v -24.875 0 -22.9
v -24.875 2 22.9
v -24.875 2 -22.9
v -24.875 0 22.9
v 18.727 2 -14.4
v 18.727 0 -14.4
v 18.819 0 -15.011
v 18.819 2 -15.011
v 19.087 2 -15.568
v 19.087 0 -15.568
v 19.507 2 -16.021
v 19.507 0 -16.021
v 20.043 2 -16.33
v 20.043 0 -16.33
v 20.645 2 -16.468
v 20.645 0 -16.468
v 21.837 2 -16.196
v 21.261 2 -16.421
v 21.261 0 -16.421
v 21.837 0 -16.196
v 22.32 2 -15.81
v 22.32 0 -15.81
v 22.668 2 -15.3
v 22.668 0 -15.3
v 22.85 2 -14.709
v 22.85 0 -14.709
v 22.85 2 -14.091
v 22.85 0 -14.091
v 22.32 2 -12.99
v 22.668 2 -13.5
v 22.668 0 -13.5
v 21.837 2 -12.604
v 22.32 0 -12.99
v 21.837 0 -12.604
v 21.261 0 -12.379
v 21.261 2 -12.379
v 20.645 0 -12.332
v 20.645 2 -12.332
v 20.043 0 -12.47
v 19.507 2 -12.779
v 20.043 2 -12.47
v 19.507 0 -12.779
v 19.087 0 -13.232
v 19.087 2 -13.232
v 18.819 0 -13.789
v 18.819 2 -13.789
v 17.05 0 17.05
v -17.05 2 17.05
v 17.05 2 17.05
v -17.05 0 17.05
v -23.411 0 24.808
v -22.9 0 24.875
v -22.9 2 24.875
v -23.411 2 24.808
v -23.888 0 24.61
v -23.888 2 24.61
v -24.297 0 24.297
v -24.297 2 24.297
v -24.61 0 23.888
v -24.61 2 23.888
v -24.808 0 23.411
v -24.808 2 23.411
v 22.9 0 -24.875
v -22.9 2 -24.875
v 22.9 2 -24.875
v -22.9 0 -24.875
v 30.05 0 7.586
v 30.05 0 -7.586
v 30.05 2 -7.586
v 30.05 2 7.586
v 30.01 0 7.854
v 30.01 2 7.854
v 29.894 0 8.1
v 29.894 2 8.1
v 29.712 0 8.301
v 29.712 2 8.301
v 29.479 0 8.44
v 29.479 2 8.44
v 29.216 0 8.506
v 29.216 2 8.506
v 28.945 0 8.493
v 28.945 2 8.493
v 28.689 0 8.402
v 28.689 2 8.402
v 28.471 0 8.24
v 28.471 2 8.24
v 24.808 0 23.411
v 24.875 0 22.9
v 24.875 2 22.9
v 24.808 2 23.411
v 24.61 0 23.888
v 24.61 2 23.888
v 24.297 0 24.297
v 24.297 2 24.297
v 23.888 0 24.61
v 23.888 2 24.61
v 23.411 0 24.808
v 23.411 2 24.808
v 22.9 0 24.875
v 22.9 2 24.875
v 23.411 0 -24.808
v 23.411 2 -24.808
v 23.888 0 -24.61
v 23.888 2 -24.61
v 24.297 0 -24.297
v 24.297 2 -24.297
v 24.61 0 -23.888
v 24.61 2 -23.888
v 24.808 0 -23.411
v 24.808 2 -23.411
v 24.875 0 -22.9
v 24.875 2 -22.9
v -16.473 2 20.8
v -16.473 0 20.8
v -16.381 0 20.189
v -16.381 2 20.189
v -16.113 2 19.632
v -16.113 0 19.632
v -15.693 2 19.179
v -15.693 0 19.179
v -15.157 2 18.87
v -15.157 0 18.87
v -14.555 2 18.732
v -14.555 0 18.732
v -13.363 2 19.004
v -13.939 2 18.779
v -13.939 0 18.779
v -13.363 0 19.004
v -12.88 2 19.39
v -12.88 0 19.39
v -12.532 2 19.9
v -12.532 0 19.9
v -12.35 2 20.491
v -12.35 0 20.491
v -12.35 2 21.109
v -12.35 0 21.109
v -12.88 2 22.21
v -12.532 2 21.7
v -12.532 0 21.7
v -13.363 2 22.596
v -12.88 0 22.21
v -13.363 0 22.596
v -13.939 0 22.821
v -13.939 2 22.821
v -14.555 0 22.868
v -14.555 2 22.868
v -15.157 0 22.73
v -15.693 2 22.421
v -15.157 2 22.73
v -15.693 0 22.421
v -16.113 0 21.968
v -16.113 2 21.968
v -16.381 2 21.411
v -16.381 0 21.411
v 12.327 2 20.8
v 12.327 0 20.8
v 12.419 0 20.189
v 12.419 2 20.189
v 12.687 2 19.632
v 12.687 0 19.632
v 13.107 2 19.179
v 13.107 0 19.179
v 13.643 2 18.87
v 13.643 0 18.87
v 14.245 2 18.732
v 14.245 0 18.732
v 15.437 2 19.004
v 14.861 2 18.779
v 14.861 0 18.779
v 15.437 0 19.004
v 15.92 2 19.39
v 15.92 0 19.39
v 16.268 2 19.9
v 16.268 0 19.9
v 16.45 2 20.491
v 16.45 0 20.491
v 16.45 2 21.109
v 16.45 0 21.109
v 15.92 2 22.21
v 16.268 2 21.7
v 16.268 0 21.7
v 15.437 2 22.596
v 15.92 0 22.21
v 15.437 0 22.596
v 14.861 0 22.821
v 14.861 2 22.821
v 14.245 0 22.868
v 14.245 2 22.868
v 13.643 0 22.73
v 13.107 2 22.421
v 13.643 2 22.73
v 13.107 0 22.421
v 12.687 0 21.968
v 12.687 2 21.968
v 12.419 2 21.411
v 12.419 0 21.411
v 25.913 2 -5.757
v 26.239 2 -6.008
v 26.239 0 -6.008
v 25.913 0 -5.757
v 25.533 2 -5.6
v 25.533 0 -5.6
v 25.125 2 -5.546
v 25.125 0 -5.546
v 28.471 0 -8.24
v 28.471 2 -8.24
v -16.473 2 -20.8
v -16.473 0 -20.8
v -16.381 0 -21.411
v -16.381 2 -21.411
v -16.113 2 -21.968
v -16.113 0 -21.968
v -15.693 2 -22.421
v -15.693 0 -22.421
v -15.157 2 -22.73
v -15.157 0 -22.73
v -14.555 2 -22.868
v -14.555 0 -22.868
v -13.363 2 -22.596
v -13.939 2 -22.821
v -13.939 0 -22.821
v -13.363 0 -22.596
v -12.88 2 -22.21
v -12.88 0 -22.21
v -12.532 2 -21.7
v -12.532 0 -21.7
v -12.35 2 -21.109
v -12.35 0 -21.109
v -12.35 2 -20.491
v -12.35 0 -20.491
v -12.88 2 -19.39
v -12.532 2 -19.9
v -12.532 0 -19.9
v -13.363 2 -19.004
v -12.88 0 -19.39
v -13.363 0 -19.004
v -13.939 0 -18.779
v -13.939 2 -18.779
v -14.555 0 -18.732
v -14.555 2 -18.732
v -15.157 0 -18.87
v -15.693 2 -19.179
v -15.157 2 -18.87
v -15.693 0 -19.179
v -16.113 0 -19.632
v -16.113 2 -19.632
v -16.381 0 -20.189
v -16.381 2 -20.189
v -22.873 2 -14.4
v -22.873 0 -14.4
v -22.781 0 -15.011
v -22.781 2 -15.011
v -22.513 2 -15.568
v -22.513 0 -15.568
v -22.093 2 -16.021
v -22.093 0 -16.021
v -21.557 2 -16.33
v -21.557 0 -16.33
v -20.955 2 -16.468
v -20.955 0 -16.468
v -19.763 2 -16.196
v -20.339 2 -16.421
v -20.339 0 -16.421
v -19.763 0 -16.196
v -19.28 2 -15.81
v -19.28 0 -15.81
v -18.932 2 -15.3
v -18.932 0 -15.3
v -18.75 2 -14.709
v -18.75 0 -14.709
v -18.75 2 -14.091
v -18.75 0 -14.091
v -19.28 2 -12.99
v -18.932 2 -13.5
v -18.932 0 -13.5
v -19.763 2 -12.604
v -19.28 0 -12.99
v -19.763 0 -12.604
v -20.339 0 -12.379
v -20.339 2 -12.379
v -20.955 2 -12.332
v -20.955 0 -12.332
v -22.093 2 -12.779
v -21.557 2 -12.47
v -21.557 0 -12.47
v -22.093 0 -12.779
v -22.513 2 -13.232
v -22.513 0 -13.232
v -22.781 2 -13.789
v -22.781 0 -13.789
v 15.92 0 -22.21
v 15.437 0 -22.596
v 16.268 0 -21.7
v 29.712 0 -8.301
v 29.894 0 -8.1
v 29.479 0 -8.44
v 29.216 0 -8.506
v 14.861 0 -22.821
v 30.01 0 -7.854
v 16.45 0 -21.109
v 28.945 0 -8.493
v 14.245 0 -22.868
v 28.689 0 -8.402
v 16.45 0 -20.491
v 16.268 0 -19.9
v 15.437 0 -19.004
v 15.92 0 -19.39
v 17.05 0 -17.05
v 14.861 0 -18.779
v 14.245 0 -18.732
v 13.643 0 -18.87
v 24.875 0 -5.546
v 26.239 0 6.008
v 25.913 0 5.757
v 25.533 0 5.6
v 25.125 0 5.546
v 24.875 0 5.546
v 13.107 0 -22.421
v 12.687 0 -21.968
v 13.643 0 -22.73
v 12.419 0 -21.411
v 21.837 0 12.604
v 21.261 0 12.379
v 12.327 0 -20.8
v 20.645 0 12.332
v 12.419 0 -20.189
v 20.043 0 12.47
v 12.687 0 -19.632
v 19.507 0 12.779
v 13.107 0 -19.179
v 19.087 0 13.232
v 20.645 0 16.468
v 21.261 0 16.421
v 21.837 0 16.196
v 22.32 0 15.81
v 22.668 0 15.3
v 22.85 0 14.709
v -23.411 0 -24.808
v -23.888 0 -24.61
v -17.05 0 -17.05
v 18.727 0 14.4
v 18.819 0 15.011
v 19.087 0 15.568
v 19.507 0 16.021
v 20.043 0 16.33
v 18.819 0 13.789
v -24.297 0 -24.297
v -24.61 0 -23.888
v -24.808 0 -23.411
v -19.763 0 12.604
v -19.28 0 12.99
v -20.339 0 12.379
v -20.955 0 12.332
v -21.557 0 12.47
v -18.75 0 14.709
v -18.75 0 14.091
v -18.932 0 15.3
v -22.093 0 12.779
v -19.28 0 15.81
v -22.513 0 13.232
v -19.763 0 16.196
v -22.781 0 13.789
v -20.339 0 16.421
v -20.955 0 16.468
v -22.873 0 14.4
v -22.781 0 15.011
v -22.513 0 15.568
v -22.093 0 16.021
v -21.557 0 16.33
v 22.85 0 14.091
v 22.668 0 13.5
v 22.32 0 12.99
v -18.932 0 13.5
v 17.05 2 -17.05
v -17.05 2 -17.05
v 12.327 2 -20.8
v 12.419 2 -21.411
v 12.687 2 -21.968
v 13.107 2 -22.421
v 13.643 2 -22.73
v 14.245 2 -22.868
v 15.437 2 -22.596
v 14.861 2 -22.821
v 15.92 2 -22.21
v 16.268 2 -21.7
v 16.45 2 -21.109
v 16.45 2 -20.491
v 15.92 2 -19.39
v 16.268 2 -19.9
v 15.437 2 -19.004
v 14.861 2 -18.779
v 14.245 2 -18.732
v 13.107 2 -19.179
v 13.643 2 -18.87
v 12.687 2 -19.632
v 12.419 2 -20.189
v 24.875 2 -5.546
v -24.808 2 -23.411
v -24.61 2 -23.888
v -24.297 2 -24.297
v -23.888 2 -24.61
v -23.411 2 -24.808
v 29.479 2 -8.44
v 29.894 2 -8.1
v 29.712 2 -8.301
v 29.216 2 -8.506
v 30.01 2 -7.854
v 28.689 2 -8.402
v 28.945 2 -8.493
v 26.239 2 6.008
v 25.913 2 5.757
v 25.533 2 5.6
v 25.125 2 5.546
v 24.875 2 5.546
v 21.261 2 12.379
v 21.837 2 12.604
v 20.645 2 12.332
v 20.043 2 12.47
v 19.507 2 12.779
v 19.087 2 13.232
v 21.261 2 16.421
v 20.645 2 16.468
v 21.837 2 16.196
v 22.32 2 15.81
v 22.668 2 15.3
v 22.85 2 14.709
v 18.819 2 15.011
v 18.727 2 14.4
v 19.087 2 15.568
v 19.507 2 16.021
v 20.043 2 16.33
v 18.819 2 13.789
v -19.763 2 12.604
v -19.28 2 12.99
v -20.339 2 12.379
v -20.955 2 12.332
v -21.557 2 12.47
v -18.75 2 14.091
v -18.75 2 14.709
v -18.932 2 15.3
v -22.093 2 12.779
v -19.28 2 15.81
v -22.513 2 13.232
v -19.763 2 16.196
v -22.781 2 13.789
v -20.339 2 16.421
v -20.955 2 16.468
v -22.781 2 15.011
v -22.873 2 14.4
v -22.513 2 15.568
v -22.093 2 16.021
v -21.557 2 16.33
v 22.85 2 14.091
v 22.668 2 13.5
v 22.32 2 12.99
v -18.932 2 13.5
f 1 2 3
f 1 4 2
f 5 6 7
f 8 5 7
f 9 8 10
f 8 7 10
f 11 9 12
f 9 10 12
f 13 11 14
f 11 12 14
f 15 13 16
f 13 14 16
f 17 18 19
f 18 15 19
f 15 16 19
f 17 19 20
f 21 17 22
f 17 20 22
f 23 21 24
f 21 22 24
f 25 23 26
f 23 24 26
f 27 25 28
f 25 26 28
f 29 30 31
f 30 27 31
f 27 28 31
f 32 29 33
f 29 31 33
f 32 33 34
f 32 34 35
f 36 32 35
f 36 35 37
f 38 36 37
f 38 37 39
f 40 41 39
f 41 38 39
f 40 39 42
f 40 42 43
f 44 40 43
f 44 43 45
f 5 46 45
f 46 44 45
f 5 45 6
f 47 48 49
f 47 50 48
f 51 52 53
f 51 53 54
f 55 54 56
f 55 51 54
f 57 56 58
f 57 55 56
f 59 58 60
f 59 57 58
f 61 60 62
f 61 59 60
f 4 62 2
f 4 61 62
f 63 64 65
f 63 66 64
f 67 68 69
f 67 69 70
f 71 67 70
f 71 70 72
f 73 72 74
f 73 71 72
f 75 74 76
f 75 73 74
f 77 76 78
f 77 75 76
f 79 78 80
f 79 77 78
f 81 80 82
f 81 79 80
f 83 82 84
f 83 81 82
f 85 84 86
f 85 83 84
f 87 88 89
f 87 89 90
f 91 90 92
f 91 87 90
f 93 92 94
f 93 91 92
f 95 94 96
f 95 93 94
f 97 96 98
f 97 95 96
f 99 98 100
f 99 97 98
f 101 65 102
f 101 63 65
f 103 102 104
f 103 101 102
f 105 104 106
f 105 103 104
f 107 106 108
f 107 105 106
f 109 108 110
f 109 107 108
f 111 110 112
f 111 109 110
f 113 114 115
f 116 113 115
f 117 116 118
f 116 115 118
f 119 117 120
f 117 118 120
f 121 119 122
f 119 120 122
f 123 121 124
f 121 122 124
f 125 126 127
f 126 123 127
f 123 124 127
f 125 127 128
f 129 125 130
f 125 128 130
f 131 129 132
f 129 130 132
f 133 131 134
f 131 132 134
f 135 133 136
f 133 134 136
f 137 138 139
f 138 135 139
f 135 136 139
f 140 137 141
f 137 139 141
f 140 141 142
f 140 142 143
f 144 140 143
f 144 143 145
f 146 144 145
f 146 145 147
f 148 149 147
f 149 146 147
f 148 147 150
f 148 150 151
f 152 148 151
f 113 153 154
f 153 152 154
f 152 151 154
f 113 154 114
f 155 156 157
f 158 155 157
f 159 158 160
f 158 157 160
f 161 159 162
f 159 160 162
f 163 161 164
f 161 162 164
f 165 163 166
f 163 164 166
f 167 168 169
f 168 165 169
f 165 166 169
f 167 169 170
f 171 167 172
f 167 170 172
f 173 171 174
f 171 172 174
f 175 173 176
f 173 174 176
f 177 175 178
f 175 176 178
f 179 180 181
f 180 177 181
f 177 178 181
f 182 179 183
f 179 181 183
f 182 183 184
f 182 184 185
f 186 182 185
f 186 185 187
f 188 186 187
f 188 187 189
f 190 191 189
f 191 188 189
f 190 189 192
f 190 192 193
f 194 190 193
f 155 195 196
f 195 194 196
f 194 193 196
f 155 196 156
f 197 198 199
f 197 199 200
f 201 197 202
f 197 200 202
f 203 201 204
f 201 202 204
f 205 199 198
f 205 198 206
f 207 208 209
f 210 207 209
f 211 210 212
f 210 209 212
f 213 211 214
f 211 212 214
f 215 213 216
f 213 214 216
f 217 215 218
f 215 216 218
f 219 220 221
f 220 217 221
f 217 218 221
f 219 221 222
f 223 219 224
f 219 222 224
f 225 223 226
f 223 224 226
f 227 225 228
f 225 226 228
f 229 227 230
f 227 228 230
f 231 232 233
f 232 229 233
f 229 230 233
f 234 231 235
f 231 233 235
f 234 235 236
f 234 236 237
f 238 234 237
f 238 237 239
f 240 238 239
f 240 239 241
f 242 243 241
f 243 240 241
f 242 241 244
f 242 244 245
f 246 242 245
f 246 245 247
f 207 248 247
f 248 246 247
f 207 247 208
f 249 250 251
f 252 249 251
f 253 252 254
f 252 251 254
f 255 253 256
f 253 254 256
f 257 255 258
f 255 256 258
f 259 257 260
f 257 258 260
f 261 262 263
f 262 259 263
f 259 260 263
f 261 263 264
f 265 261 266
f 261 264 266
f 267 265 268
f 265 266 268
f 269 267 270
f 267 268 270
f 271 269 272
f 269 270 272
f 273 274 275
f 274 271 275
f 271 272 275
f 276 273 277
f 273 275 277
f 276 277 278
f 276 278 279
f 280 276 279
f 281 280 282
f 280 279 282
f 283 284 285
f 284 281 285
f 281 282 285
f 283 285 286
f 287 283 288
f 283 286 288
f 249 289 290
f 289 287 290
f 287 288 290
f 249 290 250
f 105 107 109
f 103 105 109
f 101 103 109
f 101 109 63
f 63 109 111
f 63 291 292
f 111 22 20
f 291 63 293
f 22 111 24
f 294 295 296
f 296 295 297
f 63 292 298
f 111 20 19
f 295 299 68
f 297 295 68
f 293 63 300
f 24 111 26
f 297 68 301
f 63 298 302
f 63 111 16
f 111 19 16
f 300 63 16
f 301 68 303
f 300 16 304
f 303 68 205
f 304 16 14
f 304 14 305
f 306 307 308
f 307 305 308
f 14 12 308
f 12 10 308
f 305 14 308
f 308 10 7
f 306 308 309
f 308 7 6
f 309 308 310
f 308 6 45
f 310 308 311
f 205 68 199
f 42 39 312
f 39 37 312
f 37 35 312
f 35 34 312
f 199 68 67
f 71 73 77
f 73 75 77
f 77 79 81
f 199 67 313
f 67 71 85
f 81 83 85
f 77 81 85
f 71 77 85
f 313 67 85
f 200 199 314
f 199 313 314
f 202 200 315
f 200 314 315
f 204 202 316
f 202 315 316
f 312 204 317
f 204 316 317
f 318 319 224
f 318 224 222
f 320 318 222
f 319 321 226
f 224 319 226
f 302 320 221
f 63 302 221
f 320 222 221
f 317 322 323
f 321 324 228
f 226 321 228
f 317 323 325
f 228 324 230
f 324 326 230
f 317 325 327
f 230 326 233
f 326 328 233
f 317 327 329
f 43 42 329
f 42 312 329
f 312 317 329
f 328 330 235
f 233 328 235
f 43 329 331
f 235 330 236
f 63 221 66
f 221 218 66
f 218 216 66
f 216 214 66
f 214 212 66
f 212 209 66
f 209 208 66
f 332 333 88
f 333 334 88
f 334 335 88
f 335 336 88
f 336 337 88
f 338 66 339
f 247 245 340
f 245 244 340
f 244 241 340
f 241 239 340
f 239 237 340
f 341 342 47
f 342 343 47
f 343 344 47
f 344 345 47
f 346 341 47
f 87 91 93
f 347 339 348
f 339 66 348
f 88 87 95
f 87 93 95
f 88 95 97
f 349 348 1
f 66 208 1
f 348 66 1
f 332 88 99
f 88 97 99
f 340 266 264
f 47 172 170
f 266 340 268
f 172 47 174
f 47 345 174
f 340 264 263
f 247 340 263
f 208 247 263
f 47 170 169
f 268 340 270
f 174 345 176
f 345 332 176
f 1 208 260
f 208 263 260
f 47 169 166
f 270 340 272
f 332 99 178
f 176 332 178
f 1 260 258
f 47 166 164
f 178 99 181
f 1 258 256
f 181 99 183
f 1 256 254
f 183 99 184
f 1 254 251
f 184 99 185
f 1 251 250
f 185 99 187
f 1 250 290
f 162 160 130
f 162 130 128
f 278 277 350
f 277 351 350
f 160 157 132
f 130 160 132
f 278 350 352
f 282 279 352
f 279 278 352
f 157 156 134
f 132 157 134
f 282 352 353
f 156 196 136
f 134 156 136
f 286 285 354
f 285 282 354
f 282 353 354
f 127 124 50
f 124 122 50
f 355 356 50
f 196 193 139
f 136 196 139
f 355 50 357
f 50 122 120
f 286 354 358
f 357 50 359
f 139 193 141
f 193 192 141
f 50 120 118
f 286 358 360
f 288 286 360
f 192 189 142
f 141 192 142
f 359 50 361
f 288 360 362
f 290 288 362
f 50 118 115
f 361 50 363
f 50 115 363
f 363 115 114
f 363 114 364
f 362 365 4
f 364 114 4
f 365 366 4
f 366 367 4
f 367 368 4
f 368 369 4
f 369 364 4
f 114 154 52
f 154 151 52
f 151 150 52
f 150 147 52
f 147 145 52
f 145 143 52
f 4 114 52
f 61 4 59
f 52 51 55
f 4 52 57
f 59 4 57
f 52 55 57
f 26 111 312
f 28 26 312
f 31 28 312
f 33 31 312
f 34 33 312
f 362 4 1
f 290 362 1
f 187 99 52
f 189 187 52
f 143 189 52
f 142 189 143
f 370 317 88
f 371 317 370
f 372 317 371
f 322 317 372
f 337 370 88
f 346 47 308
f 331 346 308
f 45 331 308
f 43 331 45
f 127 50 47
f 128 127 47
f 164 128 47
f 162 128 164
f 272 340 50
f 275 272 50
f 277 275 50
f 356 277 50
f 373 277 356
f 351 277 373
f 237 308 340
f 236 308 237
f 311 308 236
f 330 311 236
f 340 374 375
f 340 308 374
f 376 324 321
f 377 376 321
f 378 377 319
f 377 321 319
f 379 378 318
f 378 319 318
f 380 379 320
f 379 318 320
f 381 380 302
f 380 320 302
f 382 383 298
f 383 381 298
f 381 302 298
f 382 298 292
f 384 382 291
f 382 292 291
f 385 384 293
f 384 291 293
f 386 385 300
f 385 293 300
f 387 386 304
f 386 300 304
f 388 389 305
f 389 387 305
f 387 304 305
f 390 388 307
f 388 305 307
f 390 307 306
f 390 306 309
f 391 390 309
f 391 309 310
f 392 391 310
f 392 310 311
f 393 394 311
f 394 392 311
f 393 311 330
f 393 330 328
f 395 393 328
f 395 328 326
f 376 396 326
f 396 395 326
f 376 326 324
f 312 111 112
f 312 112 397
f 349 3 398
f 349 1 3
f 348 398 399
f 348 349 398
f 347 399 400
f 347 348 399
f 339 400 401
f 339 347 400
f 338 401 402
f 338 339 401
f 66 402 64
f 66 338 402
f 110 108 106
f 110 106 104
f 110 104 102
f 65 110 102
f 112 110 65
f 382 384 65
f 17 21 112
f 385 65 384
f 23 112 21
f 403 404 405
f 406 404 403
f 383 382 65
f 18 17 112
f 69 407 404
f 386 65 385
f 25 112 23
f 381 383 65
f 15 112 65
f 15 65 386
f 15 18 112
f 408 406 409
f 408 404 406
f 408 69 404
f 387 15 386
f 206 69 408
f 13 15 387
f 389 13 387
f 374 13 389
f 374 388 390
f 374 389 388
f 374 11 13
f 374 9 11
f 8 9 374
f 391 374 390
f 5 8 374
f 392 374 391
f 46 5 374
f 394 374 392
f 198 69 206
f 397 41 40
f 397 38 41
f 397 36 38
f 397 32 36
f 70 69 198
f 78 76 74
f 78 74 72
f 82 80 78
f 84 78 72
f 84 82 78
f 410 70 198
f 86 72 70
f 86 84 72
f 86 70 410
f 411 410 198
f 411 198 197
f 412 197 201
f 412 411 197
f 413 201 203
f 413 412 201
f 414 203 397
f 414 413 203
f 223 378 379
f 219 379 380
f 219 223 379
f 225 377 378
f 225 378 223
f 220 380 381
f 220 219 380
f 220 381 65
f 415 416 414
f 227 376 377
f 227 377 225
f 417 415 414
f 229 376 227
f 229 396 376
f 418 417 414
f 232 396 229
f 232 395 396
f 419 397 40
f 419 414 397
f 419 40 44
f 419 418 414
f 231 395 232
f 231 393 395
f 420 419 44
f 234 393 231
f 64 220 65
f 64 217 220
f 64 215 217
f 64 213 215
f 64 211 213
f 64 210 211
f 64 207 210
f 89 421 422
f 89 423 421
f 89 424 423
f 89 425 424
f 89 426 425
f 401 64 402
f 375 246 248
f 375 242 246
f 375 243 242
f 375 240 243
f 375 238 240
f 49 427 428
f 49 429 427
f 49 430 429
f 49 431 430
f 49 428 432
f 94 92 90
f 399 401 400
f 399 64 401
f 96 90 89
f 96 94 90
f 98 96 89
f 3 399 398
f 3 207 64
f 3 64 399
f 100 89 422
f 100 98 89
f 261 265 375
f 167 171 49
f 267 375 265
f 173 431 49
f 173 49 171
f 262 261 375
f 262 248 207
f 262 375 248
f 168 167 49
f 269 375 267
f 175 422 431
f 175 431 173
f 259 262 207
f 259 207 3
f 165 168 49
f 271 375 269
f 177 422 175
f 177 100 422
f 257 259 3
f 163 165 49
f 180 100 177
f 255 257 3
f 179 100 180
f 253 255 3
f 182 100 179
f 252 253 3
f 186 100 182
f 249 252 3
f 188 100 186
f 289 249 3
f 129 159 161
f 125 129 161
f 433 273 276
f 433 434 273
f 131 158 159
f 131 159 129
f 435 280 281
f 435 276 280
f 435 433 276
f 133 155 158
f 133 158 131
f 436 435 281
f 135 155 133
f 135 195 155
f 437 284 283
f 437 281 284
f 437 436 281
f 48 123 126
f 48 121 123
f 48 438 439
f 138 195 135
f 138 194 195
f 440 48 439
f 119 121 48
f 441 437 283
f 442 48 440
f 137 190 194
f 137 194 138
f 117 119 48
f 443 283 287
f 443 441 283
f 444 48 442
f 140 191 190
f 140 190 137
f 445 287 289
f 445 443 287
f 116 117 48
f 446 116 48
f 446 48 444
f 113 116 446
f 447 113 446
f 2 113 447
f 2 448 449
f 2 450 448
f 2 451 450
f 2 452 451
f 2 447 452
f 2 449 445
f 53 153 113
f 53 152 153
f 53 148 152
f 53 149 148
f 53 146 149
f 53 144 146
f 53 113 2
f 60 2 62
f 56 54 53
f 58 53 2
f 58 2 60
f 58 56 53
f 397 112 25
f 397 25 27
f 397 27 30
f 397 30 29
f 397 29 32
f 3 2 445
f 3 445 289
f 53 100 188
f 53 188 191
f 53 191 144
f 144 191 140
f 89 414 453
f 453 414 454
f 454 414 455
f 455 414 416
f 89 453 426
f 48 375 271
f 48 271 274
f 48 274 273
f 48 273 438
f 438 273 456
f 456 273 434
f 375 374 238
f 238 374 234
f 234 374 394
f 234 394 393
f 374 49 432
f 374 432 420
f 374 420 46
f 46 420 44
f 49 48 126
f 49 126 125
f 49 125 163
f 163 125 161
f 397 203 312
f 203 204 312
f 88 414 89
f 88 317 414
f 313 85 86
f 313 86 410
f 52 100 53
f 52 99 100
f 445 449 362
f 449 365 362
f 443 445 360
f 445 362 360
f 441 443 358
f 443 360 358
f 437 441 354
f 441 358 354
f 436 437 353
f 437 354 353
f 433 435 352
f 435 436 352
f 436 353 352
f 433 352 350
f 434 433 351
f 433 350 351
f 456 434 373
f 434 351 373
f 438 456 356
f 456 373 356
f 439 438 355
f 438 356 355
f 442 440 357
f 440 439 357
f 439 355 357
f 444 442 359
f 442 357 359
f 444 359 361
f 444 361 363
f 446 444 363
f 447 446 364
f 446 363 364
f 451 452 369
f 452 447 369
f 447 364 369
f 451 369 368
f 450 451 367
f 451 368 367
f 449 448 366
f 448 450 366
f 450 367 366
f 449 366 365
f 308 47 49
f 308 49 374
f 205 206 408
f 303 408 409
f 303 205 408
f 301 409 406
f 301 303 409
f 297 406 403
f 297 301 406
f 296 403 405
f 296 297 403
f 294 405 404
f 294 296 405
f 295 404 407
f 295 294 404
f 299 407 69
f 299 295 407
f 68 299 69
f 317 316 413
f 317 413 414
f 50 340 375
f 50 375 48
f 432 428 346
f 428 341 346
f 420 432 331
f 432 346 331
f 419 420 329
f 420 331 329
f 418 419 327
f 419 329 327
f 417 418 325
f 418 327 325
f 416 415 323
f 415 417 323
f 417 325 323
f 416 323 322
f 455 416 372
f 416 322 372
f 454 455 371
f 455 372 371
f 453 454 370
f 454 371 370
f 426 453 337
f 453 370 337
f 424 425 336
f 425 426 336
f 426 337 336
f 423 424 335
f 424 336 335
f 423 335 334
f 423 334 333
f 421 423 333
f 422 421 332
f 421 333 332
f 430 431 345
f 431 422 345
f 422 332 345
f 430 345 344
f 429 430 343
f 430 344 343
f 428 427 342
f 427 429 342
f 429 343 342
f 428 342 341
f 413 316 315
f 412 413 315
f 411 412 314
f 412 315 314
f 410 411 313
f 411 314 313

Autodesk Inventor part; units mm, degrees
ref_plane "YZ Plane" through (0, 0, 0) normal (1, 0, 0) x (0, 1, 0)
ref_plane "XZ Plane" through (0, 0, 0) normal (0, 1, 0) x (-1, 0, 0)
ref_plane "XY Plane" through (0, 0, 0) normal (0, 0, 1) x (1, 0, 0)
sketch "Sketch1" plane through (0, 0, 0) normal (0, 1, 0) x (-1, 0, 0)
  circle A0 centre (-21.9, -21.9) radius 1.875 projected
  circle A1 centre (21.9, 21.9) radius 1.875 projected
  circle A2 centre (21.9, -21.9) radius 1.875 projected
  circle A3 centre (-21.9, 21.9) radius 1.875 projected
  circle A4 centre (14.4, 20.8) radius 2.0734 projected
  circle A5 centre (-14.4, -20.8) radius 2.0734 projected
  circle A6 centre (14.4, -20.8) radius 2.0734 projected
  circle A7 centre (20.8, -14.4) radius 2.0734 projected
  line L0 (-17.05, 17.05) -> (-17.05, -17.05) projected
  line L1 (17.05, 17.05) -> (-17.05, 17.05) projected
  line L2 (17.05, -17.05) -> (17.05, 17.05) projected
  line L3 (-17.05, -17.05) -> (17.05, -17.05) projected
  circle A8 centre (20.8, 14.4) radius 2.0734 projected
  circle A9 centre (-14.4, 20.8) radius 2.0734 projected
  circle A10 centre (-20.8, -14.4) radius 2.0734 projected
  circle A11 centre (-20.8, 14.4) radius 2.0734 projected
  line L4 (-22.9, 24.875) -> (22.9, 24.875) projected
  arc A12 (-22.9, 24.875) -> (-24.875, 22.9) centre (-22.9, 22.9) ccw projected
  line L5 (-24.875, -22.9) -> (-24.875, 22.9) projected
  arc A13 (-24.875, -22.9) -> (-22.9, -24.875) centre (-22.9, -22.9) ccw projected
  line L6 (22.9, -24.875) -> (-22.9, -24.875) projected
  arc A14 (22.9, -24.875) -> (24.875, -22.9) centre (22.9, -22.9) ccw projected
  line L7 (24.875, 22.9) -> (24.875, -22.9) projected
  arc A15 (24.875, 22.9) -> (22.9, 24.875) centre (22.9, 22.9) ccw projected
  arc A16 (24.9, 22.9) -> (22.9, 24.9) centre (22.9, 22.9) ccw projected
  line L8 (22.9, 24.9) -> (-22.9, 24.9) projected
  arc A17 (-22.9, 24.9) -> (-24.9, 22.9) centre (-22.9, 22.9) ccw projected
  line L9 (-24.9, 22.9) -> (-24.9, -22.9) projected
  arc A18 (-24.9, -22.9) -> (-22.9, -24.9) centre (-22.9, -22.9) ccw projected
  line L10 (-22.9, -24.9) -> (22.9, -24.9) projected
  arc A19 (22.9, -24.9) -> (24.9, -22.9) centre (22.9, -22.9) ccw projected
  line L11 (24.9, -22.9) -> (24.9, 22.9) projected
  point P0 (0, 0)
extrude "Extrusion1" add sketch "Sketch1" along normal blind 2 contours A0 | A1 | A2 | A3 | L4 A15 L7 A14 L6 A13 L5 A12
sketch "Sketch2" plane through (0, 0, 0) normal (0, 1, 0) x (-1, 0, 0)
  line L0 (-7.5858, -29.875) -> (7.5858, -29.875)
  line L1 (10, -29.875) -> (10, -19.875)
  line L2 (7.5858, -19.875) -> (-7.5858, -19.875)
  line L3 (-10, -19.875) -> (-10, -29.875)
  line L4 (-10, -29.875) -> (10, -19.875) construction
  line L5 (10, -29.875) -> (-10, -19.875) construction
  line L6 (-8.2929, -21.5821) -> (-6.0607, -23.8143)
  line L7 (-10, -19.875) -> (-6.8431, -19.875) construction
  line L8 (8.2929, -21.5821) -> (6.0607, -23.8143)
  line L9 (-8.2929, -28.1679) -> (-6.0607, -25.9357)
  line L10 (8.2929, -28.1679) -> (6.0607, -25.9357)
  arc A0 (-8.2929, -28.1679) -> (-7.5858, -29.875) centre (-7.5858, -28.875) ccw
  arc A1 (7.5858, -29.875) -> (8.2929, -28.1679) centre (7.5858, -28.875) ccw
  arc A2 (-6.0607, -25.9357) -> (-6.0607, -23.8143) centre (-7.1213, -24.875) ccw
  arc A3 (6.0607, -23.8143) -> (6.0607, -25.9357) centre (7.1213, -24.875) ccw
  arc A4 (-7.5858, -19.875) -> (-8.2929, -21.5821) centre (-7.5858, -20.875) ccw
  arc A5 (8.2929, -21.5821) -> (7.5858, -19.875) centre (7.5858, -20.875) ccw
  line L11 (-7.5858, -19.95) -> (7.5858, -19.95)
  arc A6 (8.2399, -21.5291) -> (7.5858, -19.95) centre (7.5858, -20.875) ccw
  line L12 (8.2399, -21.5291) -> (6.0076, -23.7613)
  arc A7 (6.0076, -23.7613) -> (6.0076, -25.9887) centre (7.1213, -24.875) ccw
  line L13 (6.0076, -25.9887) -> (8.2399, -28.2209)
  arc A8 (7.5858, -29.8) -> (8.2399, -28.2209) centre (7.5858, -28.875) ccw
  line L14 (7.5858, -29.8) -> (-7.5858, -29.8)
  arc A9 (-8.2399, -28.2209) -> (-7.5858, -29.8) centre (-7.5858, -28.875) ccw
  line L15 (-8.2399, -28.2209) -> (-6.0076, -25.9887)
  arc A10 (-6.0076, -25.9887) -> (-6.0076, -23.7613) centre (-7.1213, -24.875) ccw
  line L16 (-6.0076, -23.7613) -> (-8.2399, -21.5291)
  arc A11 (-7.5858, -19.95) -> (-8.2399, -21.5291) centre (-7.5858, -20.875) ccw
  line L17 (-8.2399, 21.7791) -> (-6.0076, 24.0113)
  line L18 (-7.5858, 30.05) -> (7.5858, 30.05)
  line L19 (7.5858, 20.2) -> (-7.5858, 20.2)
  line L20 (-7.5858, 20.125) -> (7.5858, 20.125)
  line L21 (7.5858, 30.125) -> (-7.5858, 30.125)
  line L22 (10, 20.125) -> (-10, 30.125) construction
  line L23 (-10, 20.125) -> (10, 30.125) construction
  arc A12 (-6.0076, 24.0113) -> (-6.0076, 26.2387) centre (-7.1213, 25.125) ccw
  arc A13 (-6.0607, 24.0643) -> (-6.0607, 26.1857) centre (-7.1213, 25.125) ccw
  arc A14 (-7.5858, 30.05) -> (-8.2399, 28.4709) centre (-7.5858, 29.125) ccw
  arc A15 (-7.5858, 30.125) -> (-8.2929, 28.4179) centre (-7.5858, 29.125) ccw
  line L24 (-8.2929, 28.4179) -> (-6.0607, 26.1857)
  line L25 (-10, 30.125) -> (-6.8431, 30.125) construction
  line L26 (-10, 30.125) -> (-10, 20.125)
  arc A16 (-8.2399, 21.7791) -> (-7.5858, 20.2) centre (-7.5858, 21.125) ccw
  arc A17 (-8.2929, 21.8321) -> (-7.5858, 20.125) centre (-7.5858, 21.125) ccw
  line L27 (-8.2929, 21.8321) -> (-6.0607, 24.0643)
  line L28 (-6.0076, 26.2387) -> (-8.2399, 28.4709)
  line L29 (10, 20.125) -> (10, 30.125)
  line L30 (8.2929, 28.4179) -> (6.0607, 26.1857)
  line L31 (8.2929, 21.8321) -> (6.0607, 24.0643)
  arc A18 (7.5858, 20.125) -> (8.2929, 21.8321) centre (7.5858, 21.125) ccw
  arc A19 (6.0076, 26.2387) -> (6.0076, 24.0113) centre (7.1213, 25.125) ccw
  arc A20 (6.0607, 26.1857) -> (6.0607, 24.0643) centre (7.1213, 25.125) ccw
  arc A21 (7.5858, 20.2) -> (8.2399, 21.7791) centre (7.5858, 21.125) ccw
  line L32 (6.0076, 24.0113) -> (8.2399, 21.7791)
  line L33 (8.2399, 28.4709) -> (6.0076, 26.2387)
  arc A22 (8.2929, 28.4179) -> (7.5858, 30.125) centre (7.5858, 29.125) ccw
  arc A23 (8.2399, 28.4709) -> (7.5858, 30.05) centre (7.5858, 29.125) ccw
  line L34 (0, 24.875) -> (0, 25.125)
  line L35 (-22.9, -24.875) -> (22.9, -24.875) projected
  line L36 (22.9, 24.875) -> (-22.9, 24.875) projected
  line L37 (0, -24.875) -> (0, -24.875)
  line L38 (5.6213, 25.125) -> (5.5463, 25.125)
  line L39 (5.5463, 25.125) -> (5.5463, 24.875)
  line L40 (5.5463, 24.875) -> (5.6213, 24.875)
  line L41 (5.6213, 24.875) -> (5.6213, 25.125)
  line L42 (-5.6213, 25.125) -> (-5.5463, 25.125)
  line L43 (-5.5463, 25.125) -> (-5.5463, 24.875)
  line L44 (-5.5463, 24.875) -> (-5.6213, 24.875)
  line L45 (-5.6213, 24.875) -> (-5.6213, 25.125)
  line L46 (-5.6213, -24.875) -> (-5.5463, -24.875)
  line L47 (-5.5463, -24.875) -> (-5.5463, -24.875)
  line L48 (-5.5463, -24.875) -> (-5.6213, -24.875)
  line L49 (-5.6213, -24.875) -> (-5.6213, -24.875)
  line L50 (5.6213, -24.875) -> (5.5463, -24.875)
  line L51 (5.5463, -24.875) -> (5.5463, -24.875)
  line L52 (5.5463, -24.875) -> (5.6213, -24.875)
  line L53 (5.6213, -24.875) -> (5.6213, -24.875)
  arc A24 (19.95, -7.5858) -> (21.5291, -8.2399) centre (20.875, -7.5858) ccw
  arc A25 (19.875, -7.5858) -> (21.5821, -8.2929) centre (20.875, -7.5858) ccw
  line L54 (21.5821, -8.2929) -> (23.8143, -6.0607)
  line L55 (23.7613, -6.0076) -> (21.5291, -8.2399)
  arc A26 (25.9357, -6.0607) -> (23.8143, -6.0607) centre (24.875, -7.1213) ccw
  arc A27 (25.9887, -6.0076) -> (23.7613, -6.0076) centre (24.875, -7.1213) ccw
  line L56 (29.875, -7.5858) -> (29.875, 7.5858)
  line L57 (29.8, 7.5858) -> (29.8, -7.5858)
  line L58 (19.95, -7.5858) -> (19.95, 7.5858)
  line L59 (19.875, 7.5858) -> (19.875, -7.5858)
  line L60 (28.2209, -8.2399) -> (25.9887, -6.0076)
  line L61 (21.5821, 8.2929) -> (23.8143, 6.0607)
  line L62 (28.1679, 8.2929) -> (25.9357, 6.0607)
  arc A28 (29.875, 7.5858) -> (28.1679, 8.2929) centre (28.875, 7.5858) ccw
  arc A29 (23.7613, 6.0076) -> (25.9887, 6.0076) centre (24.875, 7.1213) ccw
  line L63 (24.875, 5.5463) -> (24.875, 5.5463)
  line L64 (24.875, 5.6213) -> (24.875, 5.5463)
  line L65 (24.875, 5.5463) -> (24.875, 5.6213)
  line L66 (24.875, 5.6213) -> (24.875, 5.6213)
  arc A30 (23.8143, 6.0607) -> (25.9357, 6.0607) centre (24.875, 7.1213) ccw
  line L67 (25.9887, 6.0076) -> (28.2209, 8.2399)
  arc A31 (29.8, 7.5858) -> (28.2209, 8.2399) centre (28.875, 7.5858) ccw
  line L68 (21.5291, 8.2399) -> (23.7613, 6.0076)
  arc A32 (21.5291, 8.2399) -> (19.95, 7.5858) centre (20.875, 7.5858) ccw
  arc A33 (21.5821, 8.2929) -> (19.875, 7.5858) centre (20.875, 7.5858) ccw
  line L69 (24.875, -5.5463) -> (24.875, -5.5463)
  line L70 (24.875, -5.5463) -> (24.875, -5.6213)
  line L71 (24.875, -5.6213) -> (24.875, -5.5463)
  line L72 (24.875, -5.6213) -> (24.875, -5.6213)
  line L73 (24.875, 0) -> (24.875, 0)
  line L74 (28.1679, -8.2929) -> (25.9357, -6.0607)
  arc A34 (28.1679, -8.2929) -> (29.875, -7.5858) centre (28.875, -7.5858) ccw
  arc A35 (28.2209, -8.2399) -> (29.8, -7.5858) centre (28.875, -7.5858) ccw
  line L75 (-25.125, 5.6213) -> (-25.125, 5.5463)
  arc A36 (-28.4709, 8.2399) -> (-30.05, 7.5858) centre (-29.125, 7.5858) ccw
  arc A37 (-28.4179, 8.2929) -> (-30.125, 7.5858) centre (-29.125, 7.5858) ccw
  line L76 (-28.4179, 8.2929) -> (-26.1857, 6.0607)
  line L77 (-24.875, 5.5463) -> (-24.875, 5.6213)
  arc A38 (-26.2387, 6.0076) -> (-24.0113, 6.0076) centre (-25.125, 7.1213) ccw
  line L78 (-21.8321, 8.2929) -> (-24.0643, 6.0607)
  line L79 (-24.875, 0) -> (-25.125, 0)
  arc A39 (-20.2, 7.5858) -> (-21.7791, 8.2399) centre (-21.125, 7.5858) ccw
  arc A40 (-20.125, 7.5858) -> (-21.8321, 8.2929) centre (-21.125, 7.5858) ccw
  line L80 (-30.05, -7.5858) -> (-30.05, 7.5858)
  line L81 (-30.125, 7.5858) -> (-30.125, -7.5858)
  line L82 (-20.2, 7.5858) -> (-20.2, -7.5858)
  line L83 (-20.125, -7.5858) -> (-20.125, 7.5858)
  line L84 (-24.875, 5.6213) -> (-25.125, 5.6213)
  arc A41 (-26.1857, 6.0607) -> (-24.0643, 6.0607) centre (-25.125, 7.1213) ccw
  line L85 (-24.0113, 6.0076) -> (-21.7791, 8.2399)
  line L86 (-25.125, 5.5463) -> (-24.875, 5.5463)
  line L87 (-28.4709, 8.2399) -> (-26.2387, 6.0076)
  line L88 (-25.125, -5.5463) -> (-24.875, -5.5463)
  line L89 (-24.875, -5.5463) -> (-24.875, -5.6213)
  line L90 (-24.875, -5.6213) -> (-25.125, -5.6213)
  line L91 (-25.125, -5.6213) -> (-25.125, -5.5463)
  arc A42 (-30.05, -7.5858) -> (-28.4709, -8.2399) centre (-29.125, -7.5858) ccw
  arc A43 (-21.8321, -8.2929) -> (-20.125, -7.5858) centre (-21.125, -7.5858) ccw
  arc A44 (-21.7791, -8.2399) -> (-20.2, -7.5858) centre (-21.125, -7.5858) ccw
  arc A45 (-24.0113, -6.0076) -> (-26.2387, -6.0076) centre (-25.125, -7.1213) ccw
  arc A46 (-24.0643, -6.0607) -> (-26.1857, -6.0607) centre (-25.125, -7.1213) ccw
  line L92 (-21.7791, -8.2399) -> (-24.0113, -6.0076)
  line L93 (-21.8321, -8.2929) -> (-24.0643, -6.0607)
  line L94 (-28.4179, -8.2929) -> (-26.1857, -6.0607)
  line L95 (-26.2387, -6.0076) -> (-28.4709, -8.2399)
  arc A47 (-30.125, -7.5858) -> (-28.4179, -8.2929) centre (-29.125, -7.5858) ccw
  arc A48 (7.5858, 19.95) -> (8.2399, 21.5291) centre (7.5858, 20.875) ccw
  arc A49 (7.5858, 19.875) -> (8.2929, 21.5821) centre (7.5858, 20.875) ccw
  line L96 (8.2929, 21.5821) -> (6.0607, 23.8143)
  line L97 (6.0076, 23.7613) -> (8.2399, 21.5291)
  arc A50 (6.0607, 25.9357) -> (6.0607, 23.8143) centre (7.1213, 24.875) ccw
  arc A51 (6.0076, 25.9887) -> (6.0076, 23.7613) centre (7.1213, 24.875) ccw
  line L98 (7.5858, 29.875) -> (-7.5858, 29.875)
  line L99 (-7.5858, 29.8) -> (7.5858, 29.8)
  line L100 (7.5858, 19.95) -> (-7.5858, 19.95)
  line L101 (-7.5858, 19.875) -> (7.5858, 19.875)
  line L102 (8.2399, 28.2209) -> (6.0076, 25.9887)
  line L103 (-8.2929, 21.5821) -> (-6.0607, 23.8143)
  line L104 (-8.2929, 28.1679) -> (-6.0607, 25.9357)
  arc A52 (-7.5858, 29.875) -> (-8.2929, 28.1679) centre (-7.5858, 28.875) ccw
  arc A53 (-6.0076, 23.7613) -> (-6.0076, 25.9887) centre (-7.1213, 24.875) ccw
  line L105 (-5.5463, 24.875) -> (-5.5463, 24.875)
  line L106 (-5.6213, 24.875) -> (-5.5463, 24.875)
  line L107 (-5.5463, 24.875) -> (-5.6213, 24.875)
  line L108 (-5.6213, 24.875) -> (-5.6213, 24.875)
  arc A54 (-6.0607, 23.8143) -> (-6.0607, 25.9357) centre (-7.1213, 24.875) ccw
  line L109 (-6.0076, 25.9887) -> (-8.2399, 28.2209)
  arc A55 (-7.5858, 29.8) -> (-8.2399, 28.2209) centre (-7.5858, 28.875) ccw
  line L110 (-8.2399, 21.5291) -> (-6.0076, 23.7613)
  arc A56 (-8.2399, 21.5291) -> (-7.5858, 19.95) centre (-7.5858, 20.875) ccw
  arc A57 (-8.2929, 21.5821) -> (-7.5858, 19.875) centre (-7.5858, 20.875) ccw
  line L111 (5.5463, 24.875) -> (5.5463, 24.875)
  line L112 (5.5463, 24.875) -> (5.6213, 24.875)
  line L113 (5.6213, 24.875) -> (5.5463, 24.875)
  line L114 (5.6213, 24.875) -> (5.6213, 24.875)
  line L115 (0, 24.875) -> (0, 24.875)
  line L116 (8.2929, 28.1679) -> (6.0607, 25.9357)
  arc A58 (8.2929, 28.1679) -> (7.5858, 29.875) centre (7.5858, 28.875) ccw
  arc A59 (8.2399, 28.2209) -> (7.5858, 29.8) centre (7.5858, 28.875) ccw
  line L117 (-5.6213, -25.125) -> (-5.5463, -25.125)
  arc A60 (-8.2399, -28.4709) -> (-7.5858, -30.05) centre (-7.5858, -29.125) ccw
  arc A61 (-8.2929, -28.4179) -> (-7.5858, -30.125) centre (-7.5858, -29.125) ccw
  line L118 (-8.2929, -28.4179) -> (-6.0607, -26.1857)
  line L119 (-5.5463, -24.875) -> (-5.6213, -24.875)
  arc A62 (-6.0076, -26.2387) -> (-6.0076, -24.0113) centre (-7.1213, -25.125) ccw
  line L120 (-8.2929, -21.8321) -> (-6.0607, -24.0643)
  line L121 (0, -24.875) -> (0, -25.125)
  arc A63 (-7.5858, -20.2) -> (-8.2399, -21.7791) centre (-7.5858, -21.125) ccw
  arc A64 (-7.5858, -20.125) -> (-8.2929, -21.8321) centre (-7.5858, -21.125) ccw
  line L122 (7.5858, -30.05) -> (-7.5858, -30.05)
  line L123 (-7.5858, -30.125) -> (7.5858, -30.125)
  line L124 (-7.5858, -20.2) -> (7.5858, -20.2)
  line L125 (7.5858, -20.125) -> (-7.5858, -20.125)
  line L126 (-5.6213, -24.875) -> (-5.6213, -25.125)
  arc A65 (-6.0607, -26.1857) -> (-6.0607, -24.0643) centre (-7.1213, -25.125) ccw
  line L127 (-6.0076, -24.0113) -> (-8.2399, -21.7791)
  line L128 (-5.5463, -25.125) -> (-5.5463, -24.875)
  line L129 (-8.2399, -28.4709) -> (-6.0076, -26.2387)
  line L130 (5.5463, -25.125) -> (5.5463, -24.875)
  line L131 (5.5463, -24.875) -> (5.6213, -24.875)
  line L132 (5.6213, -24.875) -> (5.6213, -25.125)
  line L133 (5.6213, -25.125) -> (5.5463, -25.125)
  arc A66 (7.5858, -30.05) -> (8.2399, -28.4709) centre (7.5858, -29.125) ccw
  arc A67 (8.2929, -21.8321) -> (7.5858, -20.125) centre (7.5858, -21.125) ccw
  arc A68 (8.2399, -21.7791) -> (7.5858, -20.2) centre (7.5858, -21.125) ccw
  arc A69 (6.0076, -24.0113) -> (6.0076, -26.2387) centre (7.1213, -25.125) ccw
  arc A70 (6.0607, -24.0643) -> (6.0607, -26.1857) centre (7.1213, -25.125) ccw
  line L134 (8.2399, -21.7791) -> (6.0076, -24.0113)
  line L135 (8.2929, -21.8321) -> (6.0607, -24.0643)
  line L136 (8.2929, -28.4179) -> (6.0607, -26.1857)
  line L137 (6.0076, -26.2387) -> (8.2399, -28.4709)
  arc A71 (7.5858, -30.125) -> (8.2929, -28.4179) centre (7.5858, -29.125) ccw
  arc A72 (-19.95, 7.5858) -> (-21.5291, 8.2399) centre (-20.875, 7.5858) ccw
  arc A73 (-19.875, 7.5858) -> (-21.5821, 8.2929) centre (-20.875, 7.5858) ccw
  line L138 (-21.5821, 8.2929) -> (-23.8143, 6.0607)
  line L139 (-23.7613, 6.0076) -> (-21.5291, 8.2399)
  arc A74 (-25.9357, 6.0607) -> (-23.8143, 6.0607) centre (-24.875, 7.1213) ccw
  arc A75 (-25.9887, 6.0076) -> (-23.7613, 6.0076) centre (-24.875, 7.1213) ccw
  line L140 (-29.875, 7.5858) -> (-29.875, -7.5858)
  line L141 (-29.8, -7.5858) -> (-29.8, 7.5858)
  line L142 (-19.95, 7.5858) -> (-19.95, -7.5858)
  line L143 (-19.875, -7.5858) -> (-19.875, 7.5858)
  line L144 (-28.2209, 8.2399) -> (-25.9887, 6.0076)
  line L145 (-21.5821, -8.2929) -> (-23.8143, -6.0607)
  line L146 (-28.1679, -8.2929) -> (-25.9357, -6.0607)
  arc A76 (-29.875, -7.5858) -> (-28.1679, -8.2929) centre (-28.875, -7.5858) ccw
  arc A77 (-23.7613, -6.0076) -> (-25.9887, -6.0076) centre (-24.875, -7.1213) ccw
  line L147 (-24.875, -5.5463) -> (-24.875, -5.5463)
  line L148 (-24.875, -5.6213) -> (-24.875, -5.5463)
  line L149 (-24.875, -5.5463) -> (-24.875, -5.6213)
  line L150 (-24.875, -5.6213) -> (-24.875, -5.6213)
  arc A78 (-23.8143, -6.0607) -> (-25.9357, -6.0607) centre (-24.875, -7.1213) ccw
  line L151 (-25.9887, -6.0076) -> (-28.2209, -8.2399)
  arc A79 (-29.8, -7.5858) -> (-28.2209, -8.2399) centre (-28.875, -7.5858) ccw
  line L152 (-21.5291, -8.2399) -> (-23.7613, -6.0076)
  arc A80 (-21.5291, -8.2399) -> (-19.95, -7.5858) centre (-20.875, -7.5858) ccw
  arc A81 (-21.5821, -8.2929) -> (-19.875, -7.5858) centre (-20.875, -7.5858) ccw
  line L153 (-24.875, 5.5463) -> (-24.875, 5.5463)
  line L154 (-24.875, 5.5463) -> (-24.875, 5.6213)
  line L155 (-24.875, 5.6213) -> (-24.875, 5.5463)
  line L156 (-24.875, 5.6213) -> (-24.875, 5.6213)
  line L157 (-24.875, 0) -> (-24.875, 0)
  line L158 (-28.1679, 8.2929) -> (-25.9357, 6.0607)
  arc A82 (-28.1679, 8.2929) -> (-29.875, 7.5858) centre (-28.875, 7.5858) ccw
  arc A83 (-28.2209, 8.2399) -> (-29.8, 7.5858) centre (-28.875, 7.5858) ccw
  line L159 (25.125, -5.6213) -> (25.125, -5.5463)
  arc A84 (28.4709, -8.2399) -> (30.05, -7.5858) centre (29.125, -7.5858) ccw
  arc A85 (28.4179, -8.2929) -> (30.125, -7.5858) centre (29.125, -7.5858) ccw
  line L160 (28.4179, -8.2929) -> (26.1857, -6.0607)
  line L161 (24.875, -5.5463) -> (24.875, -5.6213)
  arc A86 (26.2387, -6.0076) -> (24.0113, -6.0076) centre (25.125, -7.1213) ccw
  line L162 (21.8321, -8.2929) -> (24.0643, -6.0607)
  line L163 (24.875, 0) -> (25.125, 0)
  arc A87 (20.2, -7.5858) -> (21.7791, -8.2399) centre (21.125, -7.5858) ccw
  arc A88 (20.125, -7.5858) -> (21.8321, -8.2929) centre (21.125, -7.5858) ccw
  line L164 (30.05, 7.5858) -> (30.05, -7.5858)
  line L165 (30.125, -7.5858) -> (30.125, 7.5858)
  line L166 (20.2, -7.5858) -> (20.2, 7.5858)
  line L167 (20.125, 7.5858) -> (20.125, -7.5858)
  line L168 (24.875, -5.6213) -> (25.125, -5.6213)
  arc A89 (26.1857, -6.0607) -> (24.0643, -6.0607) centre (25.125, -7.1213) ccw
  line L169 (24.0113, -6.0076) -> (21.7791, -8.2399)
  line L170 (25.125, -5.5463) -> (24.875, -5.5463)
  line L171 (28.4709, -8.2399) -> (26.2387, -6.0076)
  line L172 (25.125, 5.5463) -> (24.875, 5.5463)
  line L173 (24.875, 5.5463) -> (24.875, 5.6213)
  line L174 (24.875, 5.6213) -> (25.125, 5.6213)
  line L175 (25.125, 5.6213) -> (25.125, 5.5463)
  arc A90 (30.05, 7.5858) -> (28.4709, 8.2399) centre (29.125, 7.5858) ccw
  arc A91 (21.8321, 8.2929) -> (20.125, 7.5858) centre (21.125, 7.5858) ccw
  arc A92 (21.7791, 8.2399) -> (20.2, 7.5858) centre (21.125, 7.5858) ccw
  arc A93 (24.0113, 6.0076) -> (26.2387, 6.0076) centre (25.125, 7.1213) ccw
  arc A94 (24.0643, 6.0607) -> (26.1857, 6.0607) centre (25.125, 7.1213) ccw
  line L176 (21.7791, 8.2399) -> (24.0113, 6.0076)
  line L177 (21.8321, 8.2929) -> (24.0643, 6.0607)
  line L178 (28.4179, 8.2929) -> (26.1857, 6.0607)
  line L179 (26.2387, 6.0076) -> (28.4709, 8.2399)
  arc A95 (30.125, 7.5858) -> (28.4179, 8.2929) centre (29.125, 7.5858) ccw
  line L180 (-22.9, -24.875) -> (22.9, -24.875) projected
  arc A96 (22.9, -24.875) -> (24.875, -22.9) centre (22.9, -22.9) ccw projected
  line L181 (24.875, -22.9) -> (24.875, 22.9) projected
  arc A97 (24.875, 22.9) -> (22.9, 24.875) centre (22.9, 22.9) ccw projected
  line L182 (22.9, 24.875) -> (-22.9, 24.875) projected
  arc A98 (-22.9, 24.875) -> (-24.875, 22.9) centre (-22.9, 22.9) ccw projected
  line L183 (-24.875, 22.9) -> (-24.875, -22.9) projected
  arc A99 (-24.875, -22.9) -> (-22.9, -24.875) centre (-22.9, -22.9) ccw projected
  circle A100 centre (-20.8, 14.4) radius 2.0734 projected
  circle A101 centre (-20.8, -14.4) radius 2.0734 projected
  circle A102 centre (-14.4, 20.8) radius 2.0734 projected
  circle A103 centre (20.8, 14.4) radius 2.0734 projected
  circle A104 centre (20.8, -14.4) radius 2.0734 projected
  circle A105 centre (14.4, -20.8) radius 2.0734 projected
  circle A106 centre (-14.4, -20.8) radius 2.0734 projected
  circle A107 centre (14.4, 20.8) radius 2.0734 projected
  line L184 (-17.05, 17.05) -> (17.05, 17.05) projected
  line L185 (17.05, 17.05) -> (17.05, -17.05) projected
  line L186 (17.05, -17.05) -> (-17.05, -17.05) projected
  line L187 (-17.05, -17.05) -> (-17.05, 17.05) projected
  point P0 (0, 0)
  point P1 (19.875, -6.8431)
  point P2 (19.875, -10)
  point P3 (29.875, -10)
  point P4 (29.875, 10)
  point P5 (19.875, 10)
  point P6 (-30.125, 10)
  point P7 (-20.125, 10)
  point P8 (-30.125, -10)
  point P9 (-20.125, -10)
  point P10 (-30.125, -6.8431)
  point P11 (6.8431, 19.875)
  point P12 (10, 19.875)
  point P13 (10, 29.875)
  point P14 (-10, 29.875)
  point P15 (-10, 19.875)
  point P16 (-10, -30.125)
  point P17 (-10, -20.125)
  point P18 (10, -30.125)
  point P19 (10, -20.125)
  point P20 (6.8431, -30.125)
  point P21 (-19.875, 6.8431)
  point P22 (-19.875, 10)
  point P23 (-29.875, 10)
  point P24 (-29.875, -10)
  point P25 (-19.875, -10)
  point P26 (30.125, -10)
  point P27 (20.125, -10)
  point P28 (30.125, 10)
  point P29 (20.125, 10)
  point P30 (30.125, 6.8431)
  point P31 (-21, 8.5023)
  point P32 (-24.625, 5.5463)
  point P33 (-25.125, 5.5463)
  point P34 (-25.125, -5.5463)
  point P35 (-24.625, -5.5463)
  point P36 (-21, -8.5023)
  point P37 (-5.5463, 25.125)
  point P38 (5.5463, 25.125)
  dimension "d19" = 20
  dimension "d20" = 10
  dimension "d21" = 45
  dimension "d22" = 1
  dimension "d23" = 1.5
  dimension "d24" = 1
  dimension "d25" = 0.075
  dimension "d28" = 15.1716
  dimension "d29" = 2.8787
  dimension "d30" = 2.8787
  dimension "d31" = 20
  dimension "d32" = 10
  dimension "d33" = 45
  dimension "d34" = 1
  dimension "d35" = 1.5
  dimension "d36" = 1
  dimension "d37" = 0.075
  dimension "d38" = 15.1716
  dimension "d39" = 2.8787
  dimension "d40" = 2.8787
  dimension "d41" = 0.25
  dimension "d42" = 0
  dimension "d45" = 360
extrude "Extrusion2" add sketch "Sketch2" along normal up to surface (2 mm away) contours L88 A45 L95 A42 A79 L141 A83 A36 L87 A38 L86 L183 | A76 L140 A82 A36 A83 L141 A79 A42 | A42 L80 A36 A82 L140 A76
extrude "Extrusion3" [suppressed]
fillet "Fillet1" [suppressed]
properties part number "Interlinking Baseplate Pathed Male"
